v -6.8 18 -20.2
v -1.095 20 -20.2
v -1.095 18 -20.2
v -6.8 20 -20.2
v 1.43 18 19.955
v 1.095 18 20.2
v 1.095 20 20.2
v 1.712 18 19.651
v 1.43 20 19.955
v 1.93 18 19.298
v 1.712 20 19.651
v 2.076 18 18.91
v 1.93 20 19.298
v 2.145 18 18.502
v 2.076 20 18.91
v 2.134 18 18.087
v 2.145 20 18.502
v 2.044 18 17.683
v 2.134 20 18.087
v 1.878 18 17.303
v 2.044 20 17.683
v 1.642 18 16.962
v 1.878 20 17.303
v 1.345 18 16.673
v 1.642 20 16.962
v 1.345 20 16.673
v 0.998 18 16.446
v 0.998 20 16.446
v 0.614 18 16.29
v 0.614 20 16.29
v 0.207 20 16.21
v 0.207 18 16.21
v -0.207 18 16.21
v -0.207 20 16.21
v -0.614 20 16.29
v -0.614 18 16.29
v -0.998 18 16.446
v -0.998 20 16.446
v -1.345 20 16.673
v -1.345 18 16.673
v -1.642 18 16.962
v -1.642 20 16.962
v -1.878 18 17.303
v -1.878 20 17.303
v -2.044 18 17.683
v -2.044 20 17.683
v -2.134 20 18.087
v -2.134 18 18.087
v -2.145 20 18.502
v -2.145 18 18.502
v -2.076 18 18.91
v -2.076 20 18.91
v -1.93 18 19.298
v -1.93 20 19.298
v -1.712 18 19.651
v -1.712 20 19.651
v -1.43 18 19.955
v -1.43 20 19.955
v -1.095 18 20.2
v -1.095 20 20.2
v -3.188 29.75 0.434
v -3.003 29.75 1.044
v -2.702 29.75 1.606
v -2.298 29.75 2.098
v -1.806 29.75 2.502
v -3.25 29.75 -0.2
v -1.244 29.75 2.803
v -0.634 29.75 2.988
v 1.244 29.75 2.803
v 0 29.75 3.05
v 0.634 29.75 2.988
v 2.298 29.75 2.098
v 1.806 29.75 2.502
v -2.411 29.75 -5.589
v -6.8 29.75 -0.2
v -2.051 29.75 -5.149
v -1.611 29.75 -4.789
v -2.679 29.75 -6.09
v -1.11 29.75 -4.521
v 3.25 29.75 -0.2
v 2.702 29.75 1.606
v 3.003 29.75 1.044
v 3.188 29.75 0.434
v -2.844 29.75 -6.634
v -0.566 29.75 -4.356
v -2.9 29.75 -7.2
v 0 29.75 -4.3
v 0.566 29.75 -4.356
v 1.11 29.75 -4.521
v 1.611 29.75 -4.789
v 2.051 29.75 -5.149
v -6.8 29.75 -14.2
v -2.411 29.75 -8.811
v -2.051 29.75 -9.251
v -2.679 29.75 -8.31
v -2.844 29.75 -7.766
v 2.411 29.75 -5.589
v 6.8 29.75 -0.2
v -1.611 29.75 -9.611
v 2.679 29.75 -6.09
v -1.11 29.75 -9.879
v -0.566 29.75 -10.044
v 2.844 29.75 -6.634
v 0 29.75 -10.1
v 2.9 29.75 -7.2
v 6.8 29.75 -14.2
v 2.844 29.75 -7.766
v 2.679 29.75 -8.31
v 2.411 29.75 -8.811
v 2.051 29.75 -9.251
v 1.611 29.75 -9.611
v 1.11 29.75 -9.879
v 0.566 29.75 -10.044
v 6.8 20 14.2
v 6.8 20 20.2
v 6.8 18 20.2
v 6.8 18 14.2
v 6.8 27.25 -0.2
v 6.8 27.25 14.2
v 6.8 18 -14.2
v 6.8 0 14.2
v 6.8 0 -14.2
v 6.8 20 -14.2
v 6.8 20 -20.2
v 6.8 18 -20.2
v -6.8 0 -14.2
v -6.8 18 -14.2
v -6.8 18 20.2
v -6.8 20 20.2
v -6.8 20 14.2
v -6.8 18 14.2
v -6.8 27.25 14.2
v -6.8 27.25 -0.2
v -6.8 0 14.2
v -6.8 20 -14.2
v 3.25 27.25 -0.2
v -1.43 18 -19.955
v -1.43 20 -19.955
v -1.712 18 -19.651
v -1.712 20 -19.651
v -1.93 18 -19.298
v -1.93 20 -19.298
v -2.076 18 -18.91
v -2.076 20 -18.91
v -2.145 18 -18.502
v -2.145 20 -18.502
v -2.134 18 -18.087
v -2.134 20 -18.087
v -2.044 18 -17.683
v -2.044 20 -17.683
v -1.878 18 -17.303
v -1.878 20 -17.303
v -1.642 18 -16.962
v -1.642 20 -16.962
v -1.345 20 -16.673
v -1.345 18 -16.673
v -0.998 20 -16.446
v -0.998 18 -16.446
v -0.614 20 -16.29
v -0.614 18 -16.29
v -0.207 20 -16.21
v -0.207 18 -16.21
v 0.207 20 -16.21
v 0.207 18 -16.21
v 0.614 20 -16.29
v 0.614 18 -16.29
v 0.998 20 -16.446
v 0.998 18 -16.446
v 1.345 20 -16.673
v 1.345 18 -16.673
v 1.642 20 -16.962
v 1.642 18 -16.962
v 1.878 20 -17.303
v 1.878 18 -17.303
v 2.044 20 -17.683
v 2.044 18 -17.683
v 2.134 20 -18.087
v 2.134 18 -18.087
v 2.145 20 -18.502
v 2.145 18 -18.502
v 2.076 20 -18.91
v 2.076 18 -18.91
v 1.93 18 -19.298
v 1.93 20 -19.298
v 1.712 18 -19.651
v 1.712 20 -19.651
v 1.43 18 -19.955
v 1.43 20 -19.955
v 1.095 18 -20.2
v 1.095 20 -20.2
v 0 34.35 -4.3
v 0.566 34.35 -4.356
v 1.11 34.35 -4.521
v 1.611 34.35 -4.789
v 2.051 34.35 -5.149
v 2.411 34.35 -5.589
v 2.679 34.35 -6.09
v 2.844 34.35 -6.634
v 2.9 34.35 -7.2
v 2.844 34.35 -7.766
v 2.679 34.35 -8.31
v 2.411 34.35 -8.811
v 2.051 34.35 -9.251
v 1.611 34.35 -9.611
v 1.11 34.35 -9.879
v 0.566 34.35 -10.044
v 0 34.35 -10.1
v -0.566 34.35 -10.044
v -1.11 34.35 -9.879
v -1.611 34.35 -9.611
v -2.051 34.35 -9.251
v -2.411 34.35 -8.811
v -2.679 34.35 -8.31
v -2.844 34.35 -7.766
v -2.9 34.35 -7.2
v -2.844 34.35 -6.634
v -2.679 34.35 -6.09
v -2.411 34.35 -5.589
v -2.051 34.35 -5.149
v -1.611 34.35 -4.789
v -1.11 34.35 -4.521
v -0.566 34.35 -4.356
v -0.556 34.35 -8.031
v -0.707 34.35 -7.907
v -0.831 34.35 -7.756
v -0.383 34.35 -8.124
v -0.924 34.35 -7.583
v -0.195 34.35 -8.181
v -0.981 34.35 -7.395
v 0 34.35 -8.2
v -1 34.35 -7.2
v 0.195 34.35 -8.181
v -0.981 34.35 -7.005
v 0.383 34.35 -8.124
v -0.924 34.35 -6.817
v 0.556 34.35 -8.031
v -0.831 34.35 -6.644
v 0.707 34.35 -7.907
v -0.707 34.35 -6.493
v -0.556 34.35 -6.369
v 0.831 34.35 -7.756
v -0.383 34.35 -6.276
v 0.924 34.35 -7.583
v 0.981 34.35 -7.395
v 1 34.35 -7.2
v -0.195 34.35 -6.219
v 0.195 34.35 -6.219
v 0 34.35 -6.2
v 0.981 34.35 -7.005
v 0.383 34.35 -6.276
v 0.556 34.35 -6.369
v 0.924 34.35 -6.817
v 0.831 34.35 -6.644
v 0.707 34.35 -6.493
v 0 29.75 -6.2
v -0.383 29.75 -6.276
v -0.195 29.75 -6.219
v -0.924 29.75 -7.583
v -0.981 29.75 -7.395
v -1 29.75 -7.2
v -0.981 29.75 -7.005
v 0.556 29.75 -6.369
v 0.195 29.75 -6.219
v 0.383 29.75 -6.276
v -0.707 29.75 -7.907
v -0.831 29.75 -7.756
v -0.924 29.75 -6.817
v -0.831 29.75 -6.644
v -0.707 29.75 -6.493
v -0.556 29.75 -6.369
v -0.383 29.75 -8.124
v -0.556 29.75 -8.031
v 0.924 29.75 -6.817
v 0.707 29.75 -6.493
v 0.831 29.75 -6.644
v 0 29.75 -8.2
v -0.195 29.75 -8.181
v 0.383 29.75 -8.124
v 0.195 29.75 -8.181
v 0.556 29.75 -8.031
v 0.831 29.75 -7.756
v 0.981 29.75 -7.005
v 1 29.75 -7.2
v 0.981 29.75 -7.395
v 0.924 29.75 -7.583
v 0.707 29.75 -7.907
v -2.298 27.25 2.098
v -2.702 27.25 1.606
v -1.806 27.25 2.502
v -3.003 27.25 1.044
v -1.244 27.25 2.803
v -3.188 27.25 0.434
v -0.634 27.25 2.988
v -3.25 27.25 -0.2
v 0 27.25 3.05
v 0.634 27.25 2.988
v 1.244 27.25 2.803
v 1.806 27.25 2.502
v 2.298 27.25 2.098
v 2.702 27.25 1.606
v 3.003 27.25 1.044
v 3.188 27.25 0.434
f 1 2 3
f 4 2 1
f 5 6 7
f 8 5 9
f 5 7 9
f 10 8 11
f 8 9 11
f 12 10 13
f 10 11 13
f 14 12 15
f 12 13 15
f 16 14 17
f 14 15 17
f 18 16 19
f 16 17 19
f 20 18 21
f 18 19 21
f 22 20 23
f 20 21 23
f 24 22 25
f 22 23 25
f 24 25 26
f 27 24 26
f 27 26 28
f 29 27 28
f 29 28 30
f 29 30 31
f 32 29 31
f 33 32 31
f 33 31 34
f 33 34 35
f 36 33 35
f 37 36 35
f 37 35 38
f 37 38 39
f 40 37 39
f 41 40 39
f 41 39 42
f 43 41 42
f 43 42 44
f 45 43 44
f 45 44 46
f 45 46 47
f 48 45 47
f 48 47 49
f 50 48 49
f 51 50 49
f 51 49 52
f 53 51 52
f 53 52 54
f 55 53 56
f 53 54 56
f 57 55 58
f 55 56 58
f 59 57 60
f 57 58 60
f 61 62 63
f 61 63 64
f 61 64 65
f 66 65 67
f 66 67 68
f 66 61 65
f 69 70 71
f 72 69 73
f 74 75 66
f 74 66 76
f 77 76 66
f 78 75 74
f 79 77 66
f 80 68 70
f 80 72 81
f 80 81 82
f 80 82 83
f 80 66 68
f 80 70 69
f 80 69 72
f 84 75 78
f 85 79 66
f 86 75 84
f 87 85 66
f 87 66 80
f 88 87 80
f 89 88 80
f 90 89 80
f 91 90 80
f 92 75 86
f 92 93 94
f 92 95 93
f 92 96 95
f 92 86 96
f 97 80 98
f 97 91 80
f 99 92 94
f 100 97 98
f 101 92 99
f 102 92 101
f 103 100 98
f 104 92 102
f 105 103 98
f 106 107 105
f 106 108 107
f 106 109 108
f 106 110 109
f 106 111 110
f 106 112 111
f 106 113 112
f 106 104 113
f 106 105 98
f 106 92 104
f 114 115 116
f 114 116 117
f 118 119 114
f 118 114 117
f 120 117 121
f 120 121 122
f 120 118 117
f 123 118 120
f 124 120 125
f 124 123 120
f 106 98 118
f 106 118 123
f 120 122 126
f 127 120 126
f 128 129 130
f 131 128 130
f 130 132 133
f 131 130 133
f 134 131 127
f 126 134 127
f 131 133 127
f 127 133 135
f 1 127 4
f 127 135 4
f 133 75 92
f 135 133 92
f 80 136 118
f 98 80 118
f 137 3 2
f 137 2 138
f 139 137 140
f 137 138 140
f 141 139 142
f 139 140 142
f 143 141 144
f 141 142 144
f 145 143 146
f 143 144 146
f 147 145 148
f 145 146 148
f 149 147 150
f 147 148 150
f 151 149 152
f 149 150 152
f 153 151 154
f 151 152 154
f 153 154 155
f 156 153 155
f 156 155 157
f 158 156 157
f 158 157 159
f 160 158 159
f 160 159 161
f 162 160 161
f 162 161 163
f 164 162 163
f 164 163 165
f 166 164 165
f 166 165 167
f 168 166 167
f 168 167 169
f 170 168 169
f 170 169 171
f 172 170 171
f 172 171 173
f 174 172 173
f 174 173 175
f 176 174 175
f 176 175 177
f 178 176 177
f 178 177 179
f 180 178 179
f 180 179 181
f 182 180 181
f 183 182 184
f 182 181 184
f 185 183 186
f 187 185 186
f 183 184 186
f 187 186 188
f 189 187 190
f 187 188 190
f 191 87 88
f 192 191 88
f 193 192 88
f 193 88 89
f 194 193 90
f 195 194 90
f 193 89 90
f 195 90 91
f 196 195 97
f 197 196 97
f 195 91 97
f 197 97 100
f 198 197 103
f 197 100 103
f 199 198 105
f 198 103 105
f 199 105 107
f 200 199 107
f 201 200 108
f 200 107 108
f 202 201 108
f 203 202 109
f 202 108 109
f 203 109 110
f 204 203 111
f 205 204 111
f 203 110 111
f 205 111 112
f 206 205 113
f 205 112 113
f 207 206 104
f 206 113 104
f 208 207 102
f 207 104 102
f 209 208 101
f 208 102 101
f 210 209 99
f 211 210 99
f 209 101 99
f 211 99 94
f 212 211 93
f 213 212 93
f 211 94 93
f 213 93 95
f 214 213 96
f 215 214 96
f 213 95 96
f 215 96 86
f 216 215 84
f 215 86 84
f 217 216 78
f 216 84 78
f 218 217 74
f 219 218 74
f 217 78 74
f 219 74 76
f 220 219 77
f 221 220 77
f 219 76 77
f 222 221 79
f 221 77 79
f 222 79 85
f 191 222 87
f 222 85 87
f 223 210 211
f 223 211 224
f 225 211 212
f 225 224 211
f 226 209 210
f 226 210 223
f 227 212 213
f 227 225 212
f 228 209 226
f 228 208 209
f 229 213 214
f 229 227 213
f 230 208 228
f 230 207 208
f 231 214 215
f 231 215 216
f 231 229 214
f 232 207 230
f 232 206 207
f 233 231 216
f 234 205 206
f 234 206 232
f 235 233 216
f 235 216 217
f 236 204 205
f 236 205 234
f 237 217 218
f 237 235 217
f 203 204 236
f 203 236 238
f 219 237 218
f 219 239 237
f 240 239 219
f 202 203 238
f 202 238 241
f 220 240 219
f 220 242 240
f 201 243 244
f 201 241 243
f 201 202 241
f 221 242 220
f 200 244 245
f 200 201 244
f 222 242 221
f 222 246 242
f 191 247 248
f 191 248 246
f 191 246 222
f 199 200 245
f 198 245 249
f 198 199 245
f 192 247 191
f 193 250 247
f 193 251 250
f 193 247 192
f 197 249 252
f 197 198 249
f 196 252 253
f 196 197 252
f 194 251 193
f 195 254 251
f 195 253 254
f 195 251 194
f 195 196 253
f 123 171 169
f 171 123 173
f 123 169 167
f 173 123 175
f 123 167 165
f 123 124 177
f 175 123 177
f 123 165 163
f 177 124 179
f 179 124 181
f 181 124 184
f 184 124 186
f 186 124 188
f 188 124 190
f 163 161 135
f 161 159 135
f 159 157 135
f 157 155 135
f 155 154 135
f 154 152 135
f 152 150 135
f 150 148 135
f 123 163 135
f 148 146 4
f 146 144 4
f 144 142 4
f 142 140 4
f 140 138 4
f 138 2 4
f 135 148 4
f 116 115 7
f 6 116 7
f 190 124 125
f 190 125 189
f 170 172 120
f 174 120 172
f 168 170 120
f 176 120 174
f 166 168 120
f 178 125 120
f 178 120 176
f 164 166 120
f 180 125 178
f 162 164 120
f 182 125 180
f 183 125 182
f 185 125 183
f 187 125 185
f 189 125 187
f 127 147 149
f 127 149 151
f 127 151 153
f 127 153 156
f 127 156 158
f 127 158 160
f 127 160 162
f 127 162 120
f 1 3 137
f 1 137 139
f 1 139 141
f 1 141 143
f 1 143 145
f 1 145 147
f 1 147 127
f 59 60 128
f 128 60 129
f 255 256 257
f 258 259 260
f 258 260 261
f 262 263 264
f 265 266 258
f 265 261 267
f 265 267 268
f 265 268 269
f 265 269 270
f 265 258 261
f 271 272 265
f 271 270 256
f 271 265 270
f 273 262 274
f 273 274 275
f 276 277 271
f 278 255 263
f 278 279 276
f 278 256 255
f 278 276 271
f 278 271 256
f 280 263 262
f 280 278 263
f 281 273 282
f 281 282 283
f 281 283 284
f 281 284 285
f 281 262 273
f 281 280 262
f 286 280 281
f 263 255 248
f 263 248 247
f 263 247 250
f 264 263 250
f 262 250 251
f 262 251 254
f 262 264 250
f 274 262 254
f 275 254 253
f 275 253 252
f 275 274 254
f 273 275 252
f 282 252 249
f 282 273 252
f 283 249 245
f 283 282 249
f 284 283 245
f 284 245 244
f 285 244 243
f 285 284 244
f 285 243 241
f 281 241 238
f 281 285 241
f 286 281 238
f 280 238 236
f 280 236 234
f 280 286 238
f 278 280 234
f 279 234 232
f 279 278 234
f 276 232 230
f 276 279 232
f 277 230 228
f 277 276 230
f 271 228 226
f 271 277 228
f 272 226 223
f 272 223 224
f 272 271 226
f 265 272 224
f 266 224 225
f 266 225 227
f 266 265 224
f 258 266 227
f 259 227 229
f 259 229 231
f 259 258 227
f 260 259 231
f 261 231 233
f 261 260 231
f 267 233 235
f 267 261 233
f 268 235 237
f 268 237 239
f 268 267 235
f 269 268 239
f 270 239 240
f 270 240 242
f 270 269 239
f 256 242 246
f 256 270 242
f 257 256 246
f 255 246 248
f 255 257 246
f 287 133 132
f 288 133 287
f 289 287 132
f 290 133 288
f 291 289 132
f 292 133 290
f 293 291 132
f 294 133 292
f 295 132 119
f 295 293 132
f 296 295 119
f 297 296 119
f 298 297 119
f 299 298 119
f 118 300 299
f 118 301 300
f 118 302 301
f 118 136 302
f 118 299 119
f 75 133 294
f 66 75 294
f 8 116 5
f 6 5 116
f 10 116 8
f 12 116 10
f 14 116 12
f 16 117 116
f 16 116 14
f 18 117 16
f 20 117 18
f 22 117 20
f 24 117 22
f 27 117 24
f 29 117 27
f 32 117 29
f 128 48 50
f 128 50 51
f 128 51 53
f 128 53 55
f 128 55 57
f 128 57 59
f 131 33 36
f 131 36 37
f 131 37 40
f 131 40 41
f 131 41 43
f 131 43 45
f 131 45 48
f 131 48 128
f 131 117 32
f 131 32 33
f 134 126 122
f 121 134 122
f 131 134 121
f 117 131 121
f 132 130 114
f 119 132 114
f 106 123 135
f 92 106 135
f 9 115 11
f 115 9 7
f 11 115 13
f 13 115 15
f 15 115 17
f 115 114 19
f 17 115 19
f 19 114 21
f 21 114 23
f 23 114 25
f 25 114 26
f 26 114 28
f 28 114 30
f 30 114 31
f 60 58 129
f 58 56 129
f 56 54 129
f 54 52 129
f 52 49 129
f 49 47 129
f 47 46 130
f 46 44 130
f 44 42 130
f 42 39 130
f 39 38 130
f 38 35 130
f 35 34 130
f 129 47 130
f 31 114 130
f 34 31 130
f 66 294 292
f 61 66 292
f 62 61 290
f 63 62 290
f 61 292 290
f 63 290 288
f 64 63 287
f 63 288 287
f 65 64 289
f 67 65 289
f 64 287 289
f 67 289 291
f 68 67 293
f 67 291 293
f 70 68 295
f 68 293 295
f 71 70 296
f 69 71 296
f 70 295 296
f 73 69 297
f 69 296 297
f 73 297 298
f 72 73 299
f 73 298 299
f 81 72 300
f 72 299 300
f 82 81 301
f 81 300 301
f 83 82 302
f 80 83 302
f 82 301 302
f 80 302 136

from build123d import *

# Parameters (mm, degrees)
SKETCH1_W           = 13.6
SKETCH1_H           = 28.4
BOSS_EXTRUDE1_DEPTH = 27.25
BOSS_EXTRUDE2_DEPTH = 2.5
SKETCH3_R           = 2.9
SKETCH3_R_2         = 1
BOSS_EXTRUDE3_DEPTH = 4.6
SKETCH5_W           = 13.6
SKETCH5_H           = 40.4
BOSS_EXTRUDE5_DEPTH = 2
SKETCH8_R           = 2.15
CUT_EXTRUDE1_DEPTH  = 2
SKETCH7_R           = 2.15
CUT_EXTRUDE2_DEPTH  = 2


with BuildPart() as part:
    # Sketch1 → Boss-Extrude1 (new body)
    with BuildSketch(Plane(origin=(0, 0, 0), x_dir=(1, 0, 0), z_dir=(0, 1, 0))):
        Rectangle(SKETCH1_W, SKETCH1_H)
    extrude(amount=BOSS_EXTRUDE1_DEPTH)

    # Sketch2 → Boss-Extrude2 (add)
    with BuildSketch(Plane(origin=(0, 27.25, 0), x_dir=(1, 0, 0), z_dir=(0, 1, 0))):
        with BuildLine():
            ThreePointArc((-3.25, 0.2), (0, -3.05), (3.25, 0.2))
            Line((3.25, 0.2), (-3.25, 0.2))
        make_face()
        with BuildLine():
            Line((-3.25, 0.2), (3.25, 0.2))
            ThreePointArc((3.25, 0.2), (0, 3.45), (-3.25, 0.2))
        make_face()
        with BuildLine():
            Line((6.8, 0.2), (6.8, 14.2))
            Line((6.8, 14.2), (-6.8, 14.2))
            Line((-6.8, 14.2), (-6.8, 0.2))
            Line((-6.8, 0.2), (-3.25, 0.2))
            ThreePointArc((-3.25, 0.2), (0, 3.45), (3.25, 0.2))
            Line((3.25, 0.2), (6.8, 0.2))
        make_face()
    extrude(amount=BOSS_EXTRUDE2_DEPTH)

    # Sketch3 → Boss-Extrude3 (add)
    with BuildSketch(Plane(origin=(0, 29.75, 0), x_dir=(1, 0, 0), z_dir=(0, 1, 0))):
        with Locations(Location((0, 7.2, 0), (0, 0, 270))):
            Circle(SKETCH3_R)
        with Locations(Location((0, 7.2, 0), (0, 0, 270))):
            Circle(SKETCH3_R_2, mode=Mode.SUBTRACT)
    extrude(amount=BOSS_EXTRUDE3_DEPTH)

    # Sketch5 → Boss-Extrude5 (add)
    with BuildSketch(Plane(origin=(0, 20, 0), x_dir=(-1, 0, 0), z_dir=(0, -1, 0))):
        Rectangle(SKETCH5_W, SKETCH5_H)
    extrude(amount=BOSS_EXTRUDE5_DEPTH)

    # Sketch8 → Cut-Extrude1 (cut)
    with BuildSketch(Plane(origin=(0, 20, 0), x_dir=(1, 0, 0), z_dir=(0, 1, 0))):
        with Locations((0, -18.35)):
            Circle(SKETCH8_R)
    extrude(amount=-CUT_EXTRUDE1_DEPTH, mode=Mode.SUBTRACT)

    # Sketch7 → Cut-Extrude2 (cut)
    with BuildSketch(Plane(origin=(0, 20, 0), x_dir=(1, 0, 0), z_dir=(0, 1, 0))):
        with Locations((0, 18.35)):
            Circle(SKETCH7_R)
    extrude(amount=-CUT_EXTRUDE2_DEPTH, mode=Mode.SUBTRACT)


solid = part.part
